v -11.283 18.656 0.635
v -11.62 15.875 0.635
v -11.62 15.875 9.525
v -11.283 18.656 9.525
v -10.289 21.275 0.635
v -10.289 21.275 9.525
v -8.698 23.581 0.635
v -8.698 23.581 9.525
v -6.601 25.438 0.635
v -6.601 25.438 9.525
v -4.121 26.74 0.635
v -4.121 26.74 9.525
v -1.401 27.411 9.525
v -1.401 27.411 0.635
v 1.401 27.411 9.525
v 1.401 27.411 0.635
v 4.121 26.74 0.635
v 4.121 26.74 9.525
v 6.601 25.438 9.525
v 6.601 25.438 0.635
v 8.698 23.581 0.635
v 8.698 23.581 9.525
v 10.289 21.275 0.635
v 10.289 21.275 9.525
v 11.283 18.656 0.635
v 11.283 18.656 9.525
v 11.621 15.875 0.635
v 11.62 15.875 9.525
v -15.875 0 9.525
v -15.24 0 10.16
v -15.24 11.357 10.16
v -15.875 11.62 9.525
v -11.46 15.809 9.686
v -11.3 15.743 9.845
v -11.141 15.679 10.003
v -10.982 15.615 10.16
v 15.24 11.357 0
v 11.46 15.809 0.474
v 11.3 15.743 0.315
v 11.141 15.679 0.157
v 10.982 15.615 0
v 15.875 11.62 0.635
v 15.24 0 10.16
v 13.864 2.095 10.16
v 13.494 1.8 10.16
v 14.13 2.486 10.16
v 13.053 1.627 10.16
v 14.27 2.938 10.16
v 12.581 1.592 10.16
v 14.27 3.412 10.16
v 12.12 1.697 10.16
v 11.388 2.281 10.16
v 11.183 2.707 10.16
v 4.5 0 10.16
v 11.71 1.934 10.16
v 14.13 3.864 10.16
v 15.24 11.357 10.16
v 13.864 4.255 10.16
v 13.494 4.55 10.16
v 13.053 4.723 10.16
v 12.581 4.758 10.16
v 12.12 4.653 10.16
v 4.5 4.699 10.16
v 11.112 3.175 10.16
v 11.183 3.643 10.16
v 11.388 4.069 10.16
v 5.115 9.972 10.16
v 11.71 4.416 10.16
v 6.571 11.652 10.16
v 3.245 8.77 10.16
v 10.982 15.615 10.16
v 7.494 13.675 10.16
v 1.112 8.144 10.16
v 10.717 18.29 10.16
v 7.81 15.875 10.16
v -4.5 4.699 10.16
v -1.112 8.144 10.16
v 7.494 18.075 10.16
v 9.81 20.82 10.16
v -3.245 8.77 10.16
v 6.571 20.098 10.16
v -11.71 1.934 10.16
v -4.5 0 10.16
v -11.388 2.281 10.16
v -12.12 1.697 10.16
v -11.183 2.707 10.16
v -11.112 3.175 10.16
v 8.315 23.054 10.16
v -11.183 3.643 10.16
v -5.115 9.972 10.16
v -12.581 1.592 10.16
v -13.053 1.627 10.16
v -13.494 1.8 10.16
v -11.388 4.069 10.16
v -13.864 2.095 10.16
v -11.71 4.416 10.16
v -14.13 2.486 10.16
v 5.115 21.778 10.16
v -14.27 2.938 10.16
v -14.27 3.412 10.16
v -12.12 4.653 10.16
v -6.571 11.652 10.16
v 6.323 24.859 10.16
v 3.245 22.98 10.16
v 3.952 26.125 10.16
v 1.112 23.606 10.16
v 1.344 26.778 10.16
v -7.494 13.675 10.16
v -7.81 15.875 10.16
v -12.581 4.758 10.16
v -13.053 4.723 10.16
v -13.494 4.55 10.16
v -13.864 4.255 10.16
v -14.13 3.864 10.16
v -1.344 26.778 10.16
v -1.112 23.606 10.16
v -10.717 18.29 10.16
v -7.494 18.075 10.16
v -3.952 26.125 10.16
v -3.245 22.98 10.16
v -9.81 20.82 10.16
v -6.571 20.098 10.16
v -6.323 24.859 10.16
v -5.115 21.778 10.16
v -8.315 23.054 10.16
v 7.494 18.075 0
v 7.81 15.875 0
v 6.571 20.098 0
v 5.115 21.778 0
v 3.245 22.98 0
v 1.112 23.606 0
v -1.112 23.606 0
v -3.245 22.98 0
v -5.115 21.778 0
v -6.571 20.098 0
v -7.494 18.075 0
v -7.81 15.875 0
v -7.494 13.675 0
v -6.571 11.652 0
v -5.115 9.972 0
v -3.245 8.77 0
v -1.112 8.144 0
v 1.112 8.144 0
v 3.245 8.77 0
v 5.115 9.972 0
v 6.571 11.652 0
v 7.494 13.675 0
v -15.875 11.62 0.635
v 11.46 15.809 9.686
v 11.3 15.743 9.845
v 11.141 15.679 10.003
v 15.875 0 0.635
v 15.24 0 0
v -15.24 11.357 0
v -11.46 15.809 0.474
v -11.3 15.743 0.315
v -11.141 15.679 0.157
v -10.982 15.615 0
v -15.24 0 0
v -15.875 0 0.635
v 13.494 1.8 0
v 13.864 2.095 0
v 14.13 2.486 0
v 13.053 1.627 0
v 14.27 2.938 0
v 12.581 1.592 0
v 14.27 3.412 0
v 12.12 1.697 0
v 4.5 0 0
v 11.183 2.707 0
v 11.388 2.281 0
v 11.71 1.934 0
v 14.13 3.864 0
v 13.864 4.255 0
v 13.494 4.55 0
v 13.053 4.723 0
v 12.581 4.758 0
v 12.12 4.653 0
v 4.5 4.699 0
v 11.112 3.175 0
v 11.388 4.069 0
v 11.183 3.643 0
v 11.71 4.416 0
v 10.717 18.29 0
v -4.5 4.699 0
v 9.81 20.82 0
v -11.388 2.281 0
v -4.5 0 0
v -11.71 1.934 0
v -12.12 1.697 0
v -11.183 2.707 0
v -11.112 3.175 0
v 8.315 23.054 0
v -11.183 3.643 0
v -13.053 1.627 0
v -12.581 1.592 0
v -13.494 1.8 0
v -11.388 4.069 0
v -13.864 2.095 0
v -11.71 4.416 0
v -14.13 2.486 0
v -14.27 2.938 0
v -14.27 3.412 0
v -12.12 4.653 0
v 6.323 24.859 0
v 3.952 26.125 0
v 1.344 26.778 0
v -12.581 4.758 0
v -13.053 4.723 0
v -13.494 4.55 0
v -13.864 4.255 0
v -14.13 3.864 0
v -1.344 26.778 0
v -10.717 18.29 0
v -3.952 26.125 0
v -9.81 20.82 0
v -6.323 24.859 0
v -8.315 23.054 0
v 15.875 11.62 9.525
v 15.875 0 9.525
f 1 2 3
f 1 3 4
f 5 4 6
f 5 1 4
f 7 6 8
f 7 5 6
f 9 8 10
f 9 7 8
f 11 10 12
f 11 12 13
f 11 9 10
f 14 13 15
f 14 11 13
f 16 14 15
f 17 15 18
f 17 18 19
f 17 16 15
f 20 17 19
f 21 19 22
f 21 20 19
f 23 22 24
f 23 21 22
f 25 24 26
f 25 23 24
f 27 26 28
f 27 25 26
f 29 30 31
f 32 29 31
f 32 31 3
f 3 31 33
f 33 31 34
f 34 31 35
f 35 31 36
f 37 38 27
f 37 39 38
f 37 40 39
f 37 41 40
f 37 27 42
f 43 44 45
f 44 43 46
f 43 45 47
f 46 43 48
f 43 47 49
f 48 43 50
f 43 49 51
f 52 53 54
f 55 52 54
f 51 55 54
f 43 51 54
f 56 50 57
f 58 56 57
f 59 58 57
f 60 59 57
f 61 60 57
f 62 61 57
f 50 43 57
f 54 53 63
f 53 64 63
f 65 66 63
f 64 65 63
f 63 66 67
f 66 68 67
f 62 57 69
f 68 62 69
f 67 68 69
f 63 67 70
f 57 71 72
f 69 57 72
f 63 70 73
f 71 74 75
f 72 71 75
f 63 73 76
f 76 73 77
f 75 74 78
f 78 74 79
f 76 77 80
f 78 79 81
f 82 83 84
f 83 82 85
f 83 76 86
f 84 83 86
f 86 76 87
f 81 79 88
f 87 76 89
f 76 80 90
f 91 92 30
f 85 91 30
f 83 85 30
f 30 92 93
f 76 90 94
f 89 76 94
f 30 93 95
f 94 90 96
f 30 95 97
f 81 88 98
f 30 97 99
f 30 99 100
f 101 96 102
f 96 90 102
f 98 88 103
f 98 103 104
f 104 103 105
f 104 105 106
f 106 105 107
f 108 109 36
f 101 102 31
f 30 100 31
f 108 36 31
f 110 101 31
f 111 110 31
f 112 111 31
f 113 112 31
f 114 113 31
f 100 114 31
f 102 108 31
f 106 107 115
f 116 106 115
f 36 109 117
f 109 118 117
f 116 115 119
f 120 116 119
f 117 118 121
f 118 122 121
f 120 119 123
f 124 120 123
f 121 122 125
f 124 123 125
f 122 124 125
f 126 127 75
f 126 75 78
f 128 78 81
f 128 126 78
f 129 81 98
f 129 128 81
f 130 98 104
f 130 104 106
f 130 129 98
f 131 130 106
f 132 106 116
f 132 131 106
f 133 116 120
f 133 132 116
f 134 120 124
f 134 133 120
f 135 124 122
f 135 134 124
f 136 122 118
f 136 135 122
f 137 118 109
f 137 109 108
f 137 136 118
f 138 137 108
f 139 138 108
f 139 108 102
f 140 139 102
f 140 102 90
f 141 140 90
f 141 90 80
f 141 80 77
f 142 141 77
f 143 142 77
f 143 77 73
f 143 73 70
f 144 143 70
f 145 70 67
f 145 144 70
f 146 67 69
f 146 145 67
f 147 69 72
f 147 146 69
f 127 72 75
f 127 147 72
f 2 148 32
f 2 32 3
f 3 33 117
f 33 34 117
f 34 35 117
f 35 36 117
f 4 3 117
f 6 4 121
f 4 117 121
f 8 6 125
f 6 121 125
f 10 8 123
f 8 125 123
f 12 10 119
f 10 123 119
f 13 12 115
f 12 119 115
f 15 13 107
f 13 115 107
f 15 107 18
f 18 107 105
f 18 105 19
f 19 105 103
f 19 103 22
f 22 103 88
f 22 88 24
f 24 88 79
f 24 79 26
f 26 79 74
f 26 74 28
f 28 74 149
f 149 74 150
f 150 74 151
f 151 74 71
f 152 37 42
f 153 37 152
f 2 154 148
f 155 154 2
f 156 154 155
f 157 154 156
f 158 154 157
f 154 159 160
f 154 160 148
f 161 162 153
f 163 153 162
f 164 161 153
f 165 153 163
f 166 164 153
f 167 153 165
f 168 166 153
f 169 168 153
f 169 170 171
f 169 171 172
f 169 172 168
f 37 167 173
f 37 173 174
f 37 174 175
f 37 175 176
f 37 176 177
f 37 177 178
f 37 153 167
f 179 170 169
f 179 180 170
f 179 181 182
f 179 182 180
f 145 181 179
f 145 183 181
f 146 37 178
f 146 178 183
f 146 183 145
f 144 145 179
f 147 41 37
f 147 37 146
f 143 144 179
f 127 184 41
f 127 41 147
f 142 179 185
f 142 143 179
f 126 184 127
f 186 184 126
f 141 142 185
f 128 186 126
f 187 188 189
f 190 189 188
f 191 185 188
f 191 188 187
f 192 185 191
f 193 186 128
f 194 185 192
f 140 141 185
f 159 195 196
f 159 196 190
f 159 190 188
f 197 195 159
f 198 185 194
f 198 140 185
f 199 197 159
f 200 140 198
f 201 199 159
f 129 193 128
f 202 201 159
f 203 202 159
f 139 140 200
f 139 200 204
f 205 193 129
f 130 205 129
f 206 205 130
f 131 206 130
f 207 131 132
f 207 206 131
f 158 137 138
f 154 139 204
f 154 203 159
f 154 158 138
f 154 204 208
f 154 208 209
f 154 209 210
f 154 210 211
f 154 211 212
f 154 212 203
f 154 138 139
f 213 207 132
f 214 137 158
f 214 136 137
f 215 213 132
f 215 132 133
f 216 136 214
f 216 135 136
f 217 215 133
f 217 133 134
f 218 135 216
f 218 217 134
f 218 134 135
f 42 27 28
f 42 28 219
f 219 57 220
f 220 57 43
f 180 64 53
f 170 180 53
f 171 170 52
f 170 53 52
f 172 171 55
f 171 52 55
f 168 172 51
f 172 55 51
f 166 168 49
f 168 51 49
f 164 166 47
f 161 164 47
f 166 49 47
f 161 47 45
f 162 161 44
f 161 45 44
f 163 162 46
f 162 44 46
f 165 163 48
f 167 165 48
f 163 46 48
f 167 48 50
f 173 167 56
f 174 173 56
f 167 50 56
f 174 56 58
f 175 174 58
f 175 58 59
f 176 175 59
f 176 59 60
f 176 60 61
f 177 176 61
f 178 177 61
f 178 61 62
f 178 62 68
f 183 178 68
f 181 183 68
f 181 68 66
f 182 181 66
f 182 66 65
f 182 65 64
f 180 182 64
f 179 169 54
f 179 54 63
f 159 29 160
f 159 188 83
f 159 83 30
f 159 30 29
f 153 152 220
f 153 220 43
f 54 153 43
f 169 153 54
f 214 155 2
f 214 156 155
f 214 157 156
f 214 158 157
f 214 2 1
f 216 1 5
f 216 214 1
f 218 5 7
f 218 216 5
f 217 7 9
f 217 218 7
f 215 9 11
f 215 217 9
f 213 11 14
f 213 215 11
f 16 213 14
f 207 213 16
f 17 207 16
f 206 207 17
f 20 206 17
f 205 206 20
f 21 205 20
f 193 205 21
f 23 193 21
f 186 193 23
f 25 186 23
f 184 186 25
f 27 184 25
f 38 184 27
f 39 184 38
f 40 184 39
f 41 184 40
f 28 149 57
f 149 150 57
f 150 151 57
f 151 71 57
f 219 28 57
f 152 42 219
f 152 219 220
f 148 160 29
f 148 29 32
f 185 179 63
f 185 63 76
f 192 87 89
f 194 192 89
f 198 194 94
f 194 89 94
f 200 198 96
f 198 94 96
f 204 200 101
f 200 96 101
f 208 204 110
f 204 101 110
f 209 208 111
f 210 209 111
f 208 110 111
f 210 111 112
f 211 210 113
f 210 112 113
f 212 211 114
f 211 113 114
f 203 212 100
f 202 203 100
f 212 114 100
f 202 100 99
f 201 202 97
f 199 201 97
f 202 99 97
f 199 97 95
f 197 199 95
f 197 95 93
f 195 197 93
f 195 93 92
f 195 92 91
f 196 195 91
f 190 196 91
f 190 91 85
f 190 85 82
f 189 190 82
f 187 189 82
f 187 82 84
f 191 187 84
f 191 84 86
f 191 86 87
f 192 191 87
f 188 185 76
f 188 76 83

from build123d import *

# Parameters (mm, degrees)
SKETCH1_R           = 7.8105
BOSS_EXTRUDE1_DEPTH = 10.16
CHAMFER2_SIZE       = 0.635
SKETCH2_R           = 1.5875
CUT_EXTRUDE1_DEPTH  = 34.335322786


with BuildPart() as part:
    # Sketch1 → Boss-Extrude1 (new body)
    with BuildSketch(Plane.XY):
        with BuildLine():
            Line((4.5, 4.699), (-4.5, 4.699))
            Line((-4.5, 4.699), (-4.5, 0))
            Line((-4.5, 0), (-15.875, 0))
            Line((-15.875, 0), (-15.875, 11.6205))
            Line((-15.875, 11.6205), (-11.6205, 15.875))
            ThreePointArc((-11.6205, 15.875), (0, 27.4955), (11.6205, 15.875))
            Line((11.6205, 15.875), (15.875, 11.6205))
            Line((15.875, 11.6205), (15.875, 0))
            Line((15.875, 0), (4.5, 0))
            Line((4.5, 0), (4.5, 4.699))
        make_face()
        with Locations((0, 15.875)):
            Circle(SKETCH1_R, mode=Mode.SUBTRACT)
    extrude(amount=BOSS_EXTRUDE1_DEPTH)

    # Chamfer2
    chamfer2_edges = [part.edges().sort_by_distance(p)[0] for p in [
        (-13.74775, 13.74775, 0),
        (0, 27.4955, 0),
        (13.74775, 13.74775, 0),
        (15.875, 5.81025, 0),
        (15.875, 5.81025, 10.16),
        (13.74775, 13.74775, 10.16),
        (0, 27.4955, 10.16),
        (-13.74775, 13.74775, 10.16),
        (-15.875, 5.81025, 10.16),
        (-15.875, 5.81025, 0),
    ]]
    chamfer(chamfer2_edges, length=CHAMFER2_SIZE)

    # Sketch2 → Cut-Extrude1 (cut, through all)
    with BuildSketch(Plane.XY.offset(10.16)):
        with Locations((-12.7, 3.175)):
            Circle(SKETCH2_R)
        with Locations(Location((12.7, 3.175, 0), (0, 0, 180))):
            Circle(SKETCH2_R)
    extrude(amount=-CUT_EXTRUDE1_DEPTH, mode=Mode.SUBTRACT)


solid = part.part
